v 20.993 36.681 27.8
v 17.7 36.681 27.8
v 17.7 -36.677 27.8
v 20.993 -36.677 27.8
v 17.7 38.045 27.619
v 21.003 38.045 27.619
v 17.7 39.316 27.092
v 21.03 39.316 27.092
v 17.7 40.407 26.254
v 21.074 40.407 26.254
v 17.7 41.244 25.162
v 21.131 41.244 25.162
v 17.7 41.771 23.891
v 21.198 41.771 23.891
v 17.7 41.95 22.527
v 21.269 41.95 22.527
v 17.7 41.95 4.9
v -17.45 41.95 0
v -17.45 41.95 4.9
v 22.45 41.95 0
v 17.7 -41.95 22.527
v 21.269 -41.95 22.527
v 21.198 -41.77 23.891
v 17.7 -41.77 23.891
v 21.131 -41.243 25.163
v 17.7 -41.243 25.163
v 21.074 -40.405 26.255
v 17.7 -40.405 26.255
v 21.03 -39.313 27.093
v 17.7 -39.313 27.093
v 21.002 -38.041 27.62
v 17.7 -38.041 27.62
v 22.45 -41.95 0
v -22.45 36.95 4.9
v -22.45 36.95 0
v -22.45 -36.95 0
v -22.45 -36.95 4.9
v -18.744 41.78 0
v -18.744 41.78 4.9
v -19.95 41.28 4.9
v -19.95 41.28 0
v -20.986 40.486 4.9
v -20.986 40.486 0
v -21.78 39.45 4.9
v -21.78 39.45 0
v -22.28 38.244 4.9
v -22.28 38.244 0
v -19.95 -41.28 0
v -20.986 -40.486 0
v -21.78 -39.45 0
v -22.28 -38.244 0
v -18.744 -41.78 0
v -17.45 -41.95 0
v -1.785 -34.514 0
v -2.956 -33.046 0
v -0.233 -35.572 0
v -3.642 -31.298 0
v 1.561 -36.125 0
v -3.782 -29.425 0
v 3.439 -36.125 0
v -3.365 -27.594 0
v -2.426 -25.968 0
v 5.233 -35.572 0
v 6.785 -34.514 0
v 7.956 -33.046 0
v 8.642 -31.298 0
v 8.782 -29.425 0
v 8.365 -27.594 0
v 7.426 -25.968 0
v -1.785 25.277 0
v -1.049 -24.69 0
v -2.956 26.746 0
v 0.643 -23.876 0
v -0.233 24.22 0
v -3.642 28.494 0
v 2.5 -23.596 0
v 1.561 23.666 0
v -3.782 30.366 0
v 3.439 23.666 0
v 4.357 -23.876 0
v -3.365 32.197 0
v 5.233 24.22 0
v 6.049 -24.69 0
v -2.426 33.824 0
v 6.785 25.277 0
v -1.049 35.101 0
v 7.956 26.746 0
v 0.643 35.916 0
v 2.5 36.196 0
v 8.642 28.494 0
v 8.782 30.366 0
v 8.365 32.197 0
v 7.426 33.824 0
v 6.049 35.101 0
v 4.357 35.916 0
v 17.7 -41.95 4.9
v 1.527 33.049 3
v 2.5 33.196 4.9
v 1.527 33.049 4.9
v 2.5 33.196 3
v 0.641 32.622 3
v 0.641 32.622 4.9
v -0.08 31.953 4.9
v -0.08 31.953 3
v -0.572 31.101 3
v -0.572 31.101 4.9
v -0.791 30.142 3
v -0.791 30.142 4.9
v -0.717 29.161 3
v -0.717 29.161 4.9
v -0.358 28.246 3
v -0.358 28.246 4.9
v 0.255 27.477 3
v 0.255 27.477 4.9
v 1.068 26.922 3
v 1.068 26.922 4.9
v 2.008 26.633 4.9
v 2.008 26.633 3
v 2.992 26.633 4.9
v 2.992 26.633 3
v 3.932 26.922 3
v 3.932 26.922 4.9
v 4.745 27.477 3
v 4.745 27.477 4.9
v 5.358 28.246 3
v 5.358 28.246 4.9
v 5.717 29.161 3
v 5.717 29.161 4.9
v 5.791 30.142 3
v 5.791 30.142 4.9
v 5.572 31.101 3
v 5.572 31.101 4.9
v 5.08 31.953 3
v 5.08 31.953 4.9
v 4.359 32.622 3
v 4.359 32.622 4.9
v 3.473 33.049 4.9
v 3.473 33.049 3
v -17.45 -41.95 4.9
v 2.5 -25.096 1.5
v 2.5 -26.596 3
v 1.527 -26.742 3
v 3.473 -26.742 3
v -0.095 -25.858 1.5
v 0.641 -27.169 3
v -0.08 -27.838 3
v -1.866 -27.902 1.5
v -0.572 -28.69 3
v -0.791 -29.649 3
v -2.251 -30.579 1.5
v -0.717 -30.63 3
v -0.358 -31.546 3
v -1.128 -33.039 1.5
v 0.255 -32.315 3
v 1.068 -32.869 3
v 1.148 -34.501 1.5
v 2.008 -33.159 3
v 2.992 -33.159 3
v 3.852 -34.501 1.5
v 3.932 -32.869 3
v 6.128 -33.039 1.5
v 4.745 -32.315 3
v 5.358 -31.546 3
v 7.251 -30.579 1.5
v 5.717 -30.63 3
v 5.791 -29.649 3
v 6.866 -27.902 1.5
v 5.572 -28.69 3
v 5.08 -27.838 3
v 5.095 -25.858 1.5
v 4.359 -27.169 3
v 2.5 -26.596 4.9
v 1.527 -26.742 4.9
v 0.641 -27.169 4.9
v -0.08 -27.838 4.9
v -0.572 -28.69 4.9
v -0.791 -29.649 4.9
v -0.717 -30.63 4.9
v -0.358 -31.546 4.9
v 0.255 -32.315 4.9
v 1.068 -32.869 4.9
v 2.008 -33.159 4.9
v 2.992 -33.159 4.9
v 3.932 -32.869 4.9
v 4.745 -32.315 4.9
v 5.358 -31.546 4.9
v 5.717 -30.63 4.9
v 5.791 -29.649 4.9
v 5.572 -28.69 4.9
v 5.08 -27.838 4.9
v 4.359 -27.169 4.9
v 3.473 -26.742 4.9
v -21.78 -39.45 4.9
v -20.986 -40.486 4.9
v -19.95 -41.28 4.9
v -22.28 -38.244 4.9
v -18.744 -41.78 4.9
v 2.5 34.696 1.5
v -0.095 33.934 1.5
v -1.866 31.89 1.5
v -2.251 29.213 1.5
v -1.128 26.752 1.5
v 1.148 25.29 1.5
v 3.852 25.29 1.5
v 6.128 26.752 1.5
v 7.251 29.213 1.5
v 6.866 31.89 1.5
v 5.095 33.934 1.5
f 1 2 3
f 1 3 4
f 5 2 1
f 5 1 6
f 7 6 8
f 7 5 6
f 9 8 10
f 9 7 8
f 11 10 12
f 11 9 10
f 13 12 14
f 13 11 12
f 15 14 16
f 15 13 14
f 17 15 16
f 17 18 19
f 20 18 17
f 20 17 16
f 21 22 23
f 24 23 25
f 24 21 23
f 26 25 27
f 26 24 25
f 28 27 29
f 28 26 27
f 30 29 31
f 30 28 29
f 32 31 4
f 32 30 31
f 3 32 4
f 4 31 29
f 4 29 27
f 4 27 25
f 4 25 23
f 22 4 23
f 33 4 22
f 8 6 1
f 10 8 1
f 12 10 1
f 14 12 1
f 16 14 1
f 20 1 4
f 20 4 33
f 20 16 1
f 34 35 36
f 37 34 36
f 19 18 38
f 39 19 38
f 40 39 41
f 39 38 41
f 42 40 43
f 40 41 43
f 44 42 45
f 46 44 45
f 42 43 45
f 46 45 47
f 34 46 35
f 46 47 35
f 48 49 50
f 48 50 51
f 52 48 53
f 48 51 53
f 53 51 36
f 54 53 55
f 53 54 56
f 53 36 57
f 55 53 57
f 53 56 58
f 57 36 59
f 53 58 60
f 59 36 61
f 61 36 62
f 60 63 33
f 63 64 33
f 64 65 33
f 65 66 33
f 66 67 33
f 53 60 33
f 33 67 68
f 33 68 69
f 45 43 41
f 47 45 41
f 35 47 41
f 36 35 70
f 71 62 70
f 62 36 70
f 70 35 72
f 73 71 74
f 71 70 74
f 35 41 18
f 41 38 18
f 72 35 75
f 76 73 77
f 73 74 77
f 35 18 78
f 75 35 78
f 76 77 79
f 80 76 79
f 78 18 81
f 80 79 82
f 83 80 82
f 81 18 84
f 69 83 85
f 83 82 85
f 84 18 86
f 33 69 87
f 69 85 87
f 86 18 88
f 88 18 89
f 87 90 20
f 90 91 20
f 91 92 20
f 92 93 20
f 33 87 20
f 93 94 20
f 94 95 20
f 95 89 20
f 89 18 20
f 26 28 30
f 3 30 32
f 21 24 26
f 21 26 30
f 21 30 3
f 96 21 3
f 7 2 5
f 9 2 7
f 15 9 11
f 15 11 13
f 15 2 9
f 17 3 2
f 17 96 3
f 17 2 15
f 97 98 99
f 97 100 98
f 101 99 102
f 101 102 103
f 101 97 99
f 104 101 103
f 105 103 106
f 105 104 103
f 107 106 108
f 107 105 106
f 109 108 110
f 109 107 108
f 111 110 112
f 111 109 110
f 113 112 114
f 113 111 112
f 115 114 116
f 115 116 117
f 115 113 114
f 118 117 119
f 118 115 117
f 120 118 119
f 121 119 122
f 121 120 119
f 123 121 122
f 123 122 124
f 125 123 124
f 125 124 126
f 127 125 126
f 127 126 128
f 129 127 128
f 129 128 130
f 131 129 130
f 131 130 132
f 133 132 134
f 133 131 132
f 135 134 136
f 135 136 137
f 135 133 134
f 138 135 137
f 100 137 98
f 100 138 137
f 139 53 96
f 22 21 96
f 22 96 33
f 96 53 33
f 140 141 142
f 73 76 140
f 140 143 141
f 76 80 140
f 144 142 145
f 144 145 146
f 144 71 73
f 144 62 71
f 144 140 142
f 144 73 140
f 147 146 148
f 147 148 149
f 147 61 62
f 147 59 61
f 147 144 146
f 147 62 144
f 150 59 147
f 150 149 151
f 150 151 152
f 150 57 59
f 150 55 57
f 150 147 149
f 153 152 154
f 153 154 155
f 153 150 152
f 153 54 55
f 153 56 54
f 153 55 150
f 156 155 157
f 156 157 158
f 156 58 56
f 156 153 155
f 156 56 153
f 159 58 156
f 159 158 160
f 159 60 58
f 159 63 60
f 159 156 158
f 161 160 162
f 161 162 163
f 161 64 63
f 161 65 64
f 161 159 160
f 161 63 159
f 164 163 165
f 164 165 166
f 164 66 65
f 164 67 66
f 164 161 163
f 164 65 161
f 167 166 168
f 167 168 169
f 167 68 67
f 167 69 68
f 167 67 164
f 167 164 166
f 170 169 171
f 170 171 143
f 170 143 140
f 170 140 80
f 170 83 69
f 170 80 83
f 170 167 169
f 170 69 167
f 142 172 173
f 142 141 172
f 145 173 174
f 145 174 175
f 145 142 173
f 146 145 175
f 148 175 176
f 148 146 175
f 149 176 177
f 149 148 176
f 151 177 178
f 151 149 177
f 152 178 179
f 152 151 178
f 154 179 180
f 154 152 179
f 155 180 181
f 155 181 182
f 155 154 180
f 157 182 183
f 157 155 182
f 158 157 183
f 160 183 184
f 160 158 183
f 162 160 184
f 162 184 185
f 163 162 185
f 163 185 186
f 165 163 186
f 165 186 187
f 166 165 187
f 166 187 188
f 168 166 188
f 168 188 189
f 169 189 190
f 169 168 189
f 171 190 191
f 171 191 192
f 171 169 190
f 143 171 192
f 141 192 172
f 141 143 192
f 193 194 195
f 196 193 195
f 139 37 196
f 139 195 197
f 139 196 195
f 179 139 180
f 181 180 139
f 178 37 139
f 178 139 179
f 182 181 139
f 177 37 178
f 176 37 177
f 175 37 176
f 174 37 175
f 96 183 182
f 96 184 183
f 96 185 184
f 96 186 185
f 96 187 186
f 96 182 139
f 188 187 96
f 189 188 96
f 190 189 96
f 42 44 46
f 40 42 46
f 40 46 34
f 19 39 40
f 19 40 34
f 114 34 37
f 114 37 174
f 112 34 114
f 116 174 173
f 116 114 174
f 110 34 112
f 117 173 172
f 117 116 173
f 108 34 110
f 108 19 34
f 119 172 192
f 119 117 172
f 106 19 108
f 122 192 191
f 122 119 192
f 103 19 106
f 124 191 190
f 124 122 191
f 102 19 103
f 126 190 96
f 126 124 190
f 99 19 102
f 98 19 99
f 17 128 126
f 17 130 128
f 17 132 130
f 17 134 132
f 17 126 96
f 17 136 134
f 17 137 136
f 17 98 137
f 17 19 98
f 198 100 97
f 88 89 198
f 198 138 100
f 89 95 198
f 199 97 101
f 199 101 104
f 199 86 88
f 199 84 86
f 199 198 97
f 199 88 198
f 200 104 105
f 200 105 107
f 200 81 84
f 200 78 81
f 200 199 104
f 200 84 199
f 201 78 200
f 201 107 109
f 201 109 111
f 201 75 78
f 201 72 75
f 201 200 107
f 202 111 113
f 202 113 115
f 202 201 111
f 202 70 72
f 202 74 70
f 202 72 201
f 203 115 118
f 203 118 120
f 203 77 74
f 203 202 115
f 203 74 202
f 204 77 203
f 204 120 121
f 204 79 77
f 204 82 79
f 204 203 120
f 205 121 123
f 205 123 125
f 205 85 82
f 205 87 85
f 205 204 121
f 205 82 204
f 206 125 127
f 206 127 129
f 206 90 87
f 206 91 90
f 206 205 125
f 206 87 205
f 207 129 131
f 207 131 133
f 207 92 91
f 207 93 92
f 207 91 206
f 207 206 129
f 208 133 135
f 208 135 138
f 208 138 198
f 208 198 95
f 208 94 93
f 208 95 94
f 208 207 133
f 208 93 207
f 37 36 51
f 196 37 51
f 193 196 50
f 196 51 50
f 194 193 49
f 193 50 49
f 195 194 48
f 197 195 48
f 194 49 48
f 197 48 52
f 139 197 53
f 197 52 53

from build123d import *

# Parameters (mm, degrees)
BOSS_EXTRUDE1_DEPTH                            = 4.9
SKETCH2_W                                      = 4.75
SKETCH2_H                                      = 83.9
BOSS_EXTRUDE2_DEPTH                            = 22.9
CUT_EXTRUDE1_START                             = -4.75
CUT_EXTRUDE1_DEPTH                             = 4.75
CSK_FOR_M6_FLAT_HEAD_MACHINE_SCREW1_AT_2_COUNT = 2
CSK_FOR_M6_FLAT_HEAD_MACHINE_SCREW1_AT_2_PITCH = 59.791303716
SKETCH8_W                                      = 41.834673512
SKETCH8_H                                      = 83.9
CUT_REVOLVE4_ANGLE                             = 3


# Read off the part's stored shape, not the designer's step: Cut-Extrude1
with BuildPart() as part:
    # Sketch1 → Boss-Extrude1 (new body)
    with BuildSketch(Plane.XY):
        with BuildLine():
            Line((-17.45, -41.95), (22.45, -41.95))
            Line((22.45, -41.95), (22.45, 41.95))
            Line((22.45, 41.95), (-17.45, 41.95))
            ThreePointArc((-17.45, 41.95), (-20.985533906, 40.485533906), (-22.45, 36.95))
            Line((-22.45, 36.95), (-22.45, -36.95))
            ThreePointArc((-22.45, -36.95), (-20.985533906, -40.485533906), (-17.45, -41.95))
        make_face()
    extrude(amount=BOSS_EXTRUDE1_DEPTH)

    # Sketch2 → Boss-Extrude2 (add)
    with BuildSketch(Plane.XY.offset(4.9)):
        with Locations((20.075, 0)):
            Rectangle(SKETCH2_W, SKETCH2_H)
    extrude(amount=BOSS_EXTRUDE2_DEPTH)

    # Cut-Extrude1 outline → Cut-Extrude1 (cut)
    with BuildSketch(Plane(origin=(22.45, 0, 0), x_dir=(0, 0, -1), z_dir=(1, 0, 0)).offset(CUT_EXTRUDE1_START)):
        with BuildLine():
            Line((-27.8, 41.95), (-27.800002133, 36.67650399))
            ThreePointArc((-27.800002133, 36.67650399), (-26.255432728, 40.405429091), (-22.526508249, 41.95))
            Line((-22.526508249, 41.95), (-27.8, 41.95))
        make_face()
        with BuildLine():
            Line((-27.8, -36.676506119), (-27.8, -41.95))
            Line((-27.8, -41.95), (-22.526505934, -41.95))
            ThreePointArc((-22.526505934, -41.95), (-26.255429337, -40.405429468), (-27.8, -36.676506119))
        make_face()
    extrude(amount=CUT_EXTRUDE1_DEPTH, mode=Mode.SUBTRACT)

    # Sketch6 → CSK for M6 Flat Head Machine Screw1 (revolve, cut)
    with BuildSketch(Plane(origin=(2.5, 29.895651858, 0), x_dir=(0, 1, 0), z_dir=(1, 0, 0))):
        Polygon((0, 0), (0, 4.9), (3.3, 4.9), (3.3, 3), (6.3, 0), align=None)
    csk_for_m6_flat_head_machine_screw1 = revolve(axis=Axis((2.5, 29.895651858, -6.35), (0, 0, 1)), mode=Mode.SUBTRACT)

    # CSK for M6 Flat Head Machine Screw1 at 2: CSK for M6 Flat Head Machine Screw1 ×2
    with Locations(*[(0, -i * CSK_FOR_M6_FLAT_HEAD_MACHINE_SCREW1_AT_2_PITCH, 0) for i in range(1, CSK_FOR_M6_FLAT_HEAD_MACHINE_SCREW1_AT_2_COUNT)]):
        add(csk_for_m6_flat_head_machine_screw1, mode=Mode.SUBTRACT)

    # Sketch8 → Cut-Revolve4 (revolve, cut)
    with BuildSketch(Plane(origin=(22.45, 0, 0), x_dir=(0, 0, -1), z_dir=(1, 0, 0))):
        with Locations((-20.917336756, 0)):
            Rectangle(SKETCH8_W, SKETCH8_H)
    revolve(axis=Axis((22.45, -41.95, 0), (0, -1, 0)), revolution_arc=CUT_REVOLVE4_ANGLE, mode=Mode.SUBTRACT)


solid = part.part
